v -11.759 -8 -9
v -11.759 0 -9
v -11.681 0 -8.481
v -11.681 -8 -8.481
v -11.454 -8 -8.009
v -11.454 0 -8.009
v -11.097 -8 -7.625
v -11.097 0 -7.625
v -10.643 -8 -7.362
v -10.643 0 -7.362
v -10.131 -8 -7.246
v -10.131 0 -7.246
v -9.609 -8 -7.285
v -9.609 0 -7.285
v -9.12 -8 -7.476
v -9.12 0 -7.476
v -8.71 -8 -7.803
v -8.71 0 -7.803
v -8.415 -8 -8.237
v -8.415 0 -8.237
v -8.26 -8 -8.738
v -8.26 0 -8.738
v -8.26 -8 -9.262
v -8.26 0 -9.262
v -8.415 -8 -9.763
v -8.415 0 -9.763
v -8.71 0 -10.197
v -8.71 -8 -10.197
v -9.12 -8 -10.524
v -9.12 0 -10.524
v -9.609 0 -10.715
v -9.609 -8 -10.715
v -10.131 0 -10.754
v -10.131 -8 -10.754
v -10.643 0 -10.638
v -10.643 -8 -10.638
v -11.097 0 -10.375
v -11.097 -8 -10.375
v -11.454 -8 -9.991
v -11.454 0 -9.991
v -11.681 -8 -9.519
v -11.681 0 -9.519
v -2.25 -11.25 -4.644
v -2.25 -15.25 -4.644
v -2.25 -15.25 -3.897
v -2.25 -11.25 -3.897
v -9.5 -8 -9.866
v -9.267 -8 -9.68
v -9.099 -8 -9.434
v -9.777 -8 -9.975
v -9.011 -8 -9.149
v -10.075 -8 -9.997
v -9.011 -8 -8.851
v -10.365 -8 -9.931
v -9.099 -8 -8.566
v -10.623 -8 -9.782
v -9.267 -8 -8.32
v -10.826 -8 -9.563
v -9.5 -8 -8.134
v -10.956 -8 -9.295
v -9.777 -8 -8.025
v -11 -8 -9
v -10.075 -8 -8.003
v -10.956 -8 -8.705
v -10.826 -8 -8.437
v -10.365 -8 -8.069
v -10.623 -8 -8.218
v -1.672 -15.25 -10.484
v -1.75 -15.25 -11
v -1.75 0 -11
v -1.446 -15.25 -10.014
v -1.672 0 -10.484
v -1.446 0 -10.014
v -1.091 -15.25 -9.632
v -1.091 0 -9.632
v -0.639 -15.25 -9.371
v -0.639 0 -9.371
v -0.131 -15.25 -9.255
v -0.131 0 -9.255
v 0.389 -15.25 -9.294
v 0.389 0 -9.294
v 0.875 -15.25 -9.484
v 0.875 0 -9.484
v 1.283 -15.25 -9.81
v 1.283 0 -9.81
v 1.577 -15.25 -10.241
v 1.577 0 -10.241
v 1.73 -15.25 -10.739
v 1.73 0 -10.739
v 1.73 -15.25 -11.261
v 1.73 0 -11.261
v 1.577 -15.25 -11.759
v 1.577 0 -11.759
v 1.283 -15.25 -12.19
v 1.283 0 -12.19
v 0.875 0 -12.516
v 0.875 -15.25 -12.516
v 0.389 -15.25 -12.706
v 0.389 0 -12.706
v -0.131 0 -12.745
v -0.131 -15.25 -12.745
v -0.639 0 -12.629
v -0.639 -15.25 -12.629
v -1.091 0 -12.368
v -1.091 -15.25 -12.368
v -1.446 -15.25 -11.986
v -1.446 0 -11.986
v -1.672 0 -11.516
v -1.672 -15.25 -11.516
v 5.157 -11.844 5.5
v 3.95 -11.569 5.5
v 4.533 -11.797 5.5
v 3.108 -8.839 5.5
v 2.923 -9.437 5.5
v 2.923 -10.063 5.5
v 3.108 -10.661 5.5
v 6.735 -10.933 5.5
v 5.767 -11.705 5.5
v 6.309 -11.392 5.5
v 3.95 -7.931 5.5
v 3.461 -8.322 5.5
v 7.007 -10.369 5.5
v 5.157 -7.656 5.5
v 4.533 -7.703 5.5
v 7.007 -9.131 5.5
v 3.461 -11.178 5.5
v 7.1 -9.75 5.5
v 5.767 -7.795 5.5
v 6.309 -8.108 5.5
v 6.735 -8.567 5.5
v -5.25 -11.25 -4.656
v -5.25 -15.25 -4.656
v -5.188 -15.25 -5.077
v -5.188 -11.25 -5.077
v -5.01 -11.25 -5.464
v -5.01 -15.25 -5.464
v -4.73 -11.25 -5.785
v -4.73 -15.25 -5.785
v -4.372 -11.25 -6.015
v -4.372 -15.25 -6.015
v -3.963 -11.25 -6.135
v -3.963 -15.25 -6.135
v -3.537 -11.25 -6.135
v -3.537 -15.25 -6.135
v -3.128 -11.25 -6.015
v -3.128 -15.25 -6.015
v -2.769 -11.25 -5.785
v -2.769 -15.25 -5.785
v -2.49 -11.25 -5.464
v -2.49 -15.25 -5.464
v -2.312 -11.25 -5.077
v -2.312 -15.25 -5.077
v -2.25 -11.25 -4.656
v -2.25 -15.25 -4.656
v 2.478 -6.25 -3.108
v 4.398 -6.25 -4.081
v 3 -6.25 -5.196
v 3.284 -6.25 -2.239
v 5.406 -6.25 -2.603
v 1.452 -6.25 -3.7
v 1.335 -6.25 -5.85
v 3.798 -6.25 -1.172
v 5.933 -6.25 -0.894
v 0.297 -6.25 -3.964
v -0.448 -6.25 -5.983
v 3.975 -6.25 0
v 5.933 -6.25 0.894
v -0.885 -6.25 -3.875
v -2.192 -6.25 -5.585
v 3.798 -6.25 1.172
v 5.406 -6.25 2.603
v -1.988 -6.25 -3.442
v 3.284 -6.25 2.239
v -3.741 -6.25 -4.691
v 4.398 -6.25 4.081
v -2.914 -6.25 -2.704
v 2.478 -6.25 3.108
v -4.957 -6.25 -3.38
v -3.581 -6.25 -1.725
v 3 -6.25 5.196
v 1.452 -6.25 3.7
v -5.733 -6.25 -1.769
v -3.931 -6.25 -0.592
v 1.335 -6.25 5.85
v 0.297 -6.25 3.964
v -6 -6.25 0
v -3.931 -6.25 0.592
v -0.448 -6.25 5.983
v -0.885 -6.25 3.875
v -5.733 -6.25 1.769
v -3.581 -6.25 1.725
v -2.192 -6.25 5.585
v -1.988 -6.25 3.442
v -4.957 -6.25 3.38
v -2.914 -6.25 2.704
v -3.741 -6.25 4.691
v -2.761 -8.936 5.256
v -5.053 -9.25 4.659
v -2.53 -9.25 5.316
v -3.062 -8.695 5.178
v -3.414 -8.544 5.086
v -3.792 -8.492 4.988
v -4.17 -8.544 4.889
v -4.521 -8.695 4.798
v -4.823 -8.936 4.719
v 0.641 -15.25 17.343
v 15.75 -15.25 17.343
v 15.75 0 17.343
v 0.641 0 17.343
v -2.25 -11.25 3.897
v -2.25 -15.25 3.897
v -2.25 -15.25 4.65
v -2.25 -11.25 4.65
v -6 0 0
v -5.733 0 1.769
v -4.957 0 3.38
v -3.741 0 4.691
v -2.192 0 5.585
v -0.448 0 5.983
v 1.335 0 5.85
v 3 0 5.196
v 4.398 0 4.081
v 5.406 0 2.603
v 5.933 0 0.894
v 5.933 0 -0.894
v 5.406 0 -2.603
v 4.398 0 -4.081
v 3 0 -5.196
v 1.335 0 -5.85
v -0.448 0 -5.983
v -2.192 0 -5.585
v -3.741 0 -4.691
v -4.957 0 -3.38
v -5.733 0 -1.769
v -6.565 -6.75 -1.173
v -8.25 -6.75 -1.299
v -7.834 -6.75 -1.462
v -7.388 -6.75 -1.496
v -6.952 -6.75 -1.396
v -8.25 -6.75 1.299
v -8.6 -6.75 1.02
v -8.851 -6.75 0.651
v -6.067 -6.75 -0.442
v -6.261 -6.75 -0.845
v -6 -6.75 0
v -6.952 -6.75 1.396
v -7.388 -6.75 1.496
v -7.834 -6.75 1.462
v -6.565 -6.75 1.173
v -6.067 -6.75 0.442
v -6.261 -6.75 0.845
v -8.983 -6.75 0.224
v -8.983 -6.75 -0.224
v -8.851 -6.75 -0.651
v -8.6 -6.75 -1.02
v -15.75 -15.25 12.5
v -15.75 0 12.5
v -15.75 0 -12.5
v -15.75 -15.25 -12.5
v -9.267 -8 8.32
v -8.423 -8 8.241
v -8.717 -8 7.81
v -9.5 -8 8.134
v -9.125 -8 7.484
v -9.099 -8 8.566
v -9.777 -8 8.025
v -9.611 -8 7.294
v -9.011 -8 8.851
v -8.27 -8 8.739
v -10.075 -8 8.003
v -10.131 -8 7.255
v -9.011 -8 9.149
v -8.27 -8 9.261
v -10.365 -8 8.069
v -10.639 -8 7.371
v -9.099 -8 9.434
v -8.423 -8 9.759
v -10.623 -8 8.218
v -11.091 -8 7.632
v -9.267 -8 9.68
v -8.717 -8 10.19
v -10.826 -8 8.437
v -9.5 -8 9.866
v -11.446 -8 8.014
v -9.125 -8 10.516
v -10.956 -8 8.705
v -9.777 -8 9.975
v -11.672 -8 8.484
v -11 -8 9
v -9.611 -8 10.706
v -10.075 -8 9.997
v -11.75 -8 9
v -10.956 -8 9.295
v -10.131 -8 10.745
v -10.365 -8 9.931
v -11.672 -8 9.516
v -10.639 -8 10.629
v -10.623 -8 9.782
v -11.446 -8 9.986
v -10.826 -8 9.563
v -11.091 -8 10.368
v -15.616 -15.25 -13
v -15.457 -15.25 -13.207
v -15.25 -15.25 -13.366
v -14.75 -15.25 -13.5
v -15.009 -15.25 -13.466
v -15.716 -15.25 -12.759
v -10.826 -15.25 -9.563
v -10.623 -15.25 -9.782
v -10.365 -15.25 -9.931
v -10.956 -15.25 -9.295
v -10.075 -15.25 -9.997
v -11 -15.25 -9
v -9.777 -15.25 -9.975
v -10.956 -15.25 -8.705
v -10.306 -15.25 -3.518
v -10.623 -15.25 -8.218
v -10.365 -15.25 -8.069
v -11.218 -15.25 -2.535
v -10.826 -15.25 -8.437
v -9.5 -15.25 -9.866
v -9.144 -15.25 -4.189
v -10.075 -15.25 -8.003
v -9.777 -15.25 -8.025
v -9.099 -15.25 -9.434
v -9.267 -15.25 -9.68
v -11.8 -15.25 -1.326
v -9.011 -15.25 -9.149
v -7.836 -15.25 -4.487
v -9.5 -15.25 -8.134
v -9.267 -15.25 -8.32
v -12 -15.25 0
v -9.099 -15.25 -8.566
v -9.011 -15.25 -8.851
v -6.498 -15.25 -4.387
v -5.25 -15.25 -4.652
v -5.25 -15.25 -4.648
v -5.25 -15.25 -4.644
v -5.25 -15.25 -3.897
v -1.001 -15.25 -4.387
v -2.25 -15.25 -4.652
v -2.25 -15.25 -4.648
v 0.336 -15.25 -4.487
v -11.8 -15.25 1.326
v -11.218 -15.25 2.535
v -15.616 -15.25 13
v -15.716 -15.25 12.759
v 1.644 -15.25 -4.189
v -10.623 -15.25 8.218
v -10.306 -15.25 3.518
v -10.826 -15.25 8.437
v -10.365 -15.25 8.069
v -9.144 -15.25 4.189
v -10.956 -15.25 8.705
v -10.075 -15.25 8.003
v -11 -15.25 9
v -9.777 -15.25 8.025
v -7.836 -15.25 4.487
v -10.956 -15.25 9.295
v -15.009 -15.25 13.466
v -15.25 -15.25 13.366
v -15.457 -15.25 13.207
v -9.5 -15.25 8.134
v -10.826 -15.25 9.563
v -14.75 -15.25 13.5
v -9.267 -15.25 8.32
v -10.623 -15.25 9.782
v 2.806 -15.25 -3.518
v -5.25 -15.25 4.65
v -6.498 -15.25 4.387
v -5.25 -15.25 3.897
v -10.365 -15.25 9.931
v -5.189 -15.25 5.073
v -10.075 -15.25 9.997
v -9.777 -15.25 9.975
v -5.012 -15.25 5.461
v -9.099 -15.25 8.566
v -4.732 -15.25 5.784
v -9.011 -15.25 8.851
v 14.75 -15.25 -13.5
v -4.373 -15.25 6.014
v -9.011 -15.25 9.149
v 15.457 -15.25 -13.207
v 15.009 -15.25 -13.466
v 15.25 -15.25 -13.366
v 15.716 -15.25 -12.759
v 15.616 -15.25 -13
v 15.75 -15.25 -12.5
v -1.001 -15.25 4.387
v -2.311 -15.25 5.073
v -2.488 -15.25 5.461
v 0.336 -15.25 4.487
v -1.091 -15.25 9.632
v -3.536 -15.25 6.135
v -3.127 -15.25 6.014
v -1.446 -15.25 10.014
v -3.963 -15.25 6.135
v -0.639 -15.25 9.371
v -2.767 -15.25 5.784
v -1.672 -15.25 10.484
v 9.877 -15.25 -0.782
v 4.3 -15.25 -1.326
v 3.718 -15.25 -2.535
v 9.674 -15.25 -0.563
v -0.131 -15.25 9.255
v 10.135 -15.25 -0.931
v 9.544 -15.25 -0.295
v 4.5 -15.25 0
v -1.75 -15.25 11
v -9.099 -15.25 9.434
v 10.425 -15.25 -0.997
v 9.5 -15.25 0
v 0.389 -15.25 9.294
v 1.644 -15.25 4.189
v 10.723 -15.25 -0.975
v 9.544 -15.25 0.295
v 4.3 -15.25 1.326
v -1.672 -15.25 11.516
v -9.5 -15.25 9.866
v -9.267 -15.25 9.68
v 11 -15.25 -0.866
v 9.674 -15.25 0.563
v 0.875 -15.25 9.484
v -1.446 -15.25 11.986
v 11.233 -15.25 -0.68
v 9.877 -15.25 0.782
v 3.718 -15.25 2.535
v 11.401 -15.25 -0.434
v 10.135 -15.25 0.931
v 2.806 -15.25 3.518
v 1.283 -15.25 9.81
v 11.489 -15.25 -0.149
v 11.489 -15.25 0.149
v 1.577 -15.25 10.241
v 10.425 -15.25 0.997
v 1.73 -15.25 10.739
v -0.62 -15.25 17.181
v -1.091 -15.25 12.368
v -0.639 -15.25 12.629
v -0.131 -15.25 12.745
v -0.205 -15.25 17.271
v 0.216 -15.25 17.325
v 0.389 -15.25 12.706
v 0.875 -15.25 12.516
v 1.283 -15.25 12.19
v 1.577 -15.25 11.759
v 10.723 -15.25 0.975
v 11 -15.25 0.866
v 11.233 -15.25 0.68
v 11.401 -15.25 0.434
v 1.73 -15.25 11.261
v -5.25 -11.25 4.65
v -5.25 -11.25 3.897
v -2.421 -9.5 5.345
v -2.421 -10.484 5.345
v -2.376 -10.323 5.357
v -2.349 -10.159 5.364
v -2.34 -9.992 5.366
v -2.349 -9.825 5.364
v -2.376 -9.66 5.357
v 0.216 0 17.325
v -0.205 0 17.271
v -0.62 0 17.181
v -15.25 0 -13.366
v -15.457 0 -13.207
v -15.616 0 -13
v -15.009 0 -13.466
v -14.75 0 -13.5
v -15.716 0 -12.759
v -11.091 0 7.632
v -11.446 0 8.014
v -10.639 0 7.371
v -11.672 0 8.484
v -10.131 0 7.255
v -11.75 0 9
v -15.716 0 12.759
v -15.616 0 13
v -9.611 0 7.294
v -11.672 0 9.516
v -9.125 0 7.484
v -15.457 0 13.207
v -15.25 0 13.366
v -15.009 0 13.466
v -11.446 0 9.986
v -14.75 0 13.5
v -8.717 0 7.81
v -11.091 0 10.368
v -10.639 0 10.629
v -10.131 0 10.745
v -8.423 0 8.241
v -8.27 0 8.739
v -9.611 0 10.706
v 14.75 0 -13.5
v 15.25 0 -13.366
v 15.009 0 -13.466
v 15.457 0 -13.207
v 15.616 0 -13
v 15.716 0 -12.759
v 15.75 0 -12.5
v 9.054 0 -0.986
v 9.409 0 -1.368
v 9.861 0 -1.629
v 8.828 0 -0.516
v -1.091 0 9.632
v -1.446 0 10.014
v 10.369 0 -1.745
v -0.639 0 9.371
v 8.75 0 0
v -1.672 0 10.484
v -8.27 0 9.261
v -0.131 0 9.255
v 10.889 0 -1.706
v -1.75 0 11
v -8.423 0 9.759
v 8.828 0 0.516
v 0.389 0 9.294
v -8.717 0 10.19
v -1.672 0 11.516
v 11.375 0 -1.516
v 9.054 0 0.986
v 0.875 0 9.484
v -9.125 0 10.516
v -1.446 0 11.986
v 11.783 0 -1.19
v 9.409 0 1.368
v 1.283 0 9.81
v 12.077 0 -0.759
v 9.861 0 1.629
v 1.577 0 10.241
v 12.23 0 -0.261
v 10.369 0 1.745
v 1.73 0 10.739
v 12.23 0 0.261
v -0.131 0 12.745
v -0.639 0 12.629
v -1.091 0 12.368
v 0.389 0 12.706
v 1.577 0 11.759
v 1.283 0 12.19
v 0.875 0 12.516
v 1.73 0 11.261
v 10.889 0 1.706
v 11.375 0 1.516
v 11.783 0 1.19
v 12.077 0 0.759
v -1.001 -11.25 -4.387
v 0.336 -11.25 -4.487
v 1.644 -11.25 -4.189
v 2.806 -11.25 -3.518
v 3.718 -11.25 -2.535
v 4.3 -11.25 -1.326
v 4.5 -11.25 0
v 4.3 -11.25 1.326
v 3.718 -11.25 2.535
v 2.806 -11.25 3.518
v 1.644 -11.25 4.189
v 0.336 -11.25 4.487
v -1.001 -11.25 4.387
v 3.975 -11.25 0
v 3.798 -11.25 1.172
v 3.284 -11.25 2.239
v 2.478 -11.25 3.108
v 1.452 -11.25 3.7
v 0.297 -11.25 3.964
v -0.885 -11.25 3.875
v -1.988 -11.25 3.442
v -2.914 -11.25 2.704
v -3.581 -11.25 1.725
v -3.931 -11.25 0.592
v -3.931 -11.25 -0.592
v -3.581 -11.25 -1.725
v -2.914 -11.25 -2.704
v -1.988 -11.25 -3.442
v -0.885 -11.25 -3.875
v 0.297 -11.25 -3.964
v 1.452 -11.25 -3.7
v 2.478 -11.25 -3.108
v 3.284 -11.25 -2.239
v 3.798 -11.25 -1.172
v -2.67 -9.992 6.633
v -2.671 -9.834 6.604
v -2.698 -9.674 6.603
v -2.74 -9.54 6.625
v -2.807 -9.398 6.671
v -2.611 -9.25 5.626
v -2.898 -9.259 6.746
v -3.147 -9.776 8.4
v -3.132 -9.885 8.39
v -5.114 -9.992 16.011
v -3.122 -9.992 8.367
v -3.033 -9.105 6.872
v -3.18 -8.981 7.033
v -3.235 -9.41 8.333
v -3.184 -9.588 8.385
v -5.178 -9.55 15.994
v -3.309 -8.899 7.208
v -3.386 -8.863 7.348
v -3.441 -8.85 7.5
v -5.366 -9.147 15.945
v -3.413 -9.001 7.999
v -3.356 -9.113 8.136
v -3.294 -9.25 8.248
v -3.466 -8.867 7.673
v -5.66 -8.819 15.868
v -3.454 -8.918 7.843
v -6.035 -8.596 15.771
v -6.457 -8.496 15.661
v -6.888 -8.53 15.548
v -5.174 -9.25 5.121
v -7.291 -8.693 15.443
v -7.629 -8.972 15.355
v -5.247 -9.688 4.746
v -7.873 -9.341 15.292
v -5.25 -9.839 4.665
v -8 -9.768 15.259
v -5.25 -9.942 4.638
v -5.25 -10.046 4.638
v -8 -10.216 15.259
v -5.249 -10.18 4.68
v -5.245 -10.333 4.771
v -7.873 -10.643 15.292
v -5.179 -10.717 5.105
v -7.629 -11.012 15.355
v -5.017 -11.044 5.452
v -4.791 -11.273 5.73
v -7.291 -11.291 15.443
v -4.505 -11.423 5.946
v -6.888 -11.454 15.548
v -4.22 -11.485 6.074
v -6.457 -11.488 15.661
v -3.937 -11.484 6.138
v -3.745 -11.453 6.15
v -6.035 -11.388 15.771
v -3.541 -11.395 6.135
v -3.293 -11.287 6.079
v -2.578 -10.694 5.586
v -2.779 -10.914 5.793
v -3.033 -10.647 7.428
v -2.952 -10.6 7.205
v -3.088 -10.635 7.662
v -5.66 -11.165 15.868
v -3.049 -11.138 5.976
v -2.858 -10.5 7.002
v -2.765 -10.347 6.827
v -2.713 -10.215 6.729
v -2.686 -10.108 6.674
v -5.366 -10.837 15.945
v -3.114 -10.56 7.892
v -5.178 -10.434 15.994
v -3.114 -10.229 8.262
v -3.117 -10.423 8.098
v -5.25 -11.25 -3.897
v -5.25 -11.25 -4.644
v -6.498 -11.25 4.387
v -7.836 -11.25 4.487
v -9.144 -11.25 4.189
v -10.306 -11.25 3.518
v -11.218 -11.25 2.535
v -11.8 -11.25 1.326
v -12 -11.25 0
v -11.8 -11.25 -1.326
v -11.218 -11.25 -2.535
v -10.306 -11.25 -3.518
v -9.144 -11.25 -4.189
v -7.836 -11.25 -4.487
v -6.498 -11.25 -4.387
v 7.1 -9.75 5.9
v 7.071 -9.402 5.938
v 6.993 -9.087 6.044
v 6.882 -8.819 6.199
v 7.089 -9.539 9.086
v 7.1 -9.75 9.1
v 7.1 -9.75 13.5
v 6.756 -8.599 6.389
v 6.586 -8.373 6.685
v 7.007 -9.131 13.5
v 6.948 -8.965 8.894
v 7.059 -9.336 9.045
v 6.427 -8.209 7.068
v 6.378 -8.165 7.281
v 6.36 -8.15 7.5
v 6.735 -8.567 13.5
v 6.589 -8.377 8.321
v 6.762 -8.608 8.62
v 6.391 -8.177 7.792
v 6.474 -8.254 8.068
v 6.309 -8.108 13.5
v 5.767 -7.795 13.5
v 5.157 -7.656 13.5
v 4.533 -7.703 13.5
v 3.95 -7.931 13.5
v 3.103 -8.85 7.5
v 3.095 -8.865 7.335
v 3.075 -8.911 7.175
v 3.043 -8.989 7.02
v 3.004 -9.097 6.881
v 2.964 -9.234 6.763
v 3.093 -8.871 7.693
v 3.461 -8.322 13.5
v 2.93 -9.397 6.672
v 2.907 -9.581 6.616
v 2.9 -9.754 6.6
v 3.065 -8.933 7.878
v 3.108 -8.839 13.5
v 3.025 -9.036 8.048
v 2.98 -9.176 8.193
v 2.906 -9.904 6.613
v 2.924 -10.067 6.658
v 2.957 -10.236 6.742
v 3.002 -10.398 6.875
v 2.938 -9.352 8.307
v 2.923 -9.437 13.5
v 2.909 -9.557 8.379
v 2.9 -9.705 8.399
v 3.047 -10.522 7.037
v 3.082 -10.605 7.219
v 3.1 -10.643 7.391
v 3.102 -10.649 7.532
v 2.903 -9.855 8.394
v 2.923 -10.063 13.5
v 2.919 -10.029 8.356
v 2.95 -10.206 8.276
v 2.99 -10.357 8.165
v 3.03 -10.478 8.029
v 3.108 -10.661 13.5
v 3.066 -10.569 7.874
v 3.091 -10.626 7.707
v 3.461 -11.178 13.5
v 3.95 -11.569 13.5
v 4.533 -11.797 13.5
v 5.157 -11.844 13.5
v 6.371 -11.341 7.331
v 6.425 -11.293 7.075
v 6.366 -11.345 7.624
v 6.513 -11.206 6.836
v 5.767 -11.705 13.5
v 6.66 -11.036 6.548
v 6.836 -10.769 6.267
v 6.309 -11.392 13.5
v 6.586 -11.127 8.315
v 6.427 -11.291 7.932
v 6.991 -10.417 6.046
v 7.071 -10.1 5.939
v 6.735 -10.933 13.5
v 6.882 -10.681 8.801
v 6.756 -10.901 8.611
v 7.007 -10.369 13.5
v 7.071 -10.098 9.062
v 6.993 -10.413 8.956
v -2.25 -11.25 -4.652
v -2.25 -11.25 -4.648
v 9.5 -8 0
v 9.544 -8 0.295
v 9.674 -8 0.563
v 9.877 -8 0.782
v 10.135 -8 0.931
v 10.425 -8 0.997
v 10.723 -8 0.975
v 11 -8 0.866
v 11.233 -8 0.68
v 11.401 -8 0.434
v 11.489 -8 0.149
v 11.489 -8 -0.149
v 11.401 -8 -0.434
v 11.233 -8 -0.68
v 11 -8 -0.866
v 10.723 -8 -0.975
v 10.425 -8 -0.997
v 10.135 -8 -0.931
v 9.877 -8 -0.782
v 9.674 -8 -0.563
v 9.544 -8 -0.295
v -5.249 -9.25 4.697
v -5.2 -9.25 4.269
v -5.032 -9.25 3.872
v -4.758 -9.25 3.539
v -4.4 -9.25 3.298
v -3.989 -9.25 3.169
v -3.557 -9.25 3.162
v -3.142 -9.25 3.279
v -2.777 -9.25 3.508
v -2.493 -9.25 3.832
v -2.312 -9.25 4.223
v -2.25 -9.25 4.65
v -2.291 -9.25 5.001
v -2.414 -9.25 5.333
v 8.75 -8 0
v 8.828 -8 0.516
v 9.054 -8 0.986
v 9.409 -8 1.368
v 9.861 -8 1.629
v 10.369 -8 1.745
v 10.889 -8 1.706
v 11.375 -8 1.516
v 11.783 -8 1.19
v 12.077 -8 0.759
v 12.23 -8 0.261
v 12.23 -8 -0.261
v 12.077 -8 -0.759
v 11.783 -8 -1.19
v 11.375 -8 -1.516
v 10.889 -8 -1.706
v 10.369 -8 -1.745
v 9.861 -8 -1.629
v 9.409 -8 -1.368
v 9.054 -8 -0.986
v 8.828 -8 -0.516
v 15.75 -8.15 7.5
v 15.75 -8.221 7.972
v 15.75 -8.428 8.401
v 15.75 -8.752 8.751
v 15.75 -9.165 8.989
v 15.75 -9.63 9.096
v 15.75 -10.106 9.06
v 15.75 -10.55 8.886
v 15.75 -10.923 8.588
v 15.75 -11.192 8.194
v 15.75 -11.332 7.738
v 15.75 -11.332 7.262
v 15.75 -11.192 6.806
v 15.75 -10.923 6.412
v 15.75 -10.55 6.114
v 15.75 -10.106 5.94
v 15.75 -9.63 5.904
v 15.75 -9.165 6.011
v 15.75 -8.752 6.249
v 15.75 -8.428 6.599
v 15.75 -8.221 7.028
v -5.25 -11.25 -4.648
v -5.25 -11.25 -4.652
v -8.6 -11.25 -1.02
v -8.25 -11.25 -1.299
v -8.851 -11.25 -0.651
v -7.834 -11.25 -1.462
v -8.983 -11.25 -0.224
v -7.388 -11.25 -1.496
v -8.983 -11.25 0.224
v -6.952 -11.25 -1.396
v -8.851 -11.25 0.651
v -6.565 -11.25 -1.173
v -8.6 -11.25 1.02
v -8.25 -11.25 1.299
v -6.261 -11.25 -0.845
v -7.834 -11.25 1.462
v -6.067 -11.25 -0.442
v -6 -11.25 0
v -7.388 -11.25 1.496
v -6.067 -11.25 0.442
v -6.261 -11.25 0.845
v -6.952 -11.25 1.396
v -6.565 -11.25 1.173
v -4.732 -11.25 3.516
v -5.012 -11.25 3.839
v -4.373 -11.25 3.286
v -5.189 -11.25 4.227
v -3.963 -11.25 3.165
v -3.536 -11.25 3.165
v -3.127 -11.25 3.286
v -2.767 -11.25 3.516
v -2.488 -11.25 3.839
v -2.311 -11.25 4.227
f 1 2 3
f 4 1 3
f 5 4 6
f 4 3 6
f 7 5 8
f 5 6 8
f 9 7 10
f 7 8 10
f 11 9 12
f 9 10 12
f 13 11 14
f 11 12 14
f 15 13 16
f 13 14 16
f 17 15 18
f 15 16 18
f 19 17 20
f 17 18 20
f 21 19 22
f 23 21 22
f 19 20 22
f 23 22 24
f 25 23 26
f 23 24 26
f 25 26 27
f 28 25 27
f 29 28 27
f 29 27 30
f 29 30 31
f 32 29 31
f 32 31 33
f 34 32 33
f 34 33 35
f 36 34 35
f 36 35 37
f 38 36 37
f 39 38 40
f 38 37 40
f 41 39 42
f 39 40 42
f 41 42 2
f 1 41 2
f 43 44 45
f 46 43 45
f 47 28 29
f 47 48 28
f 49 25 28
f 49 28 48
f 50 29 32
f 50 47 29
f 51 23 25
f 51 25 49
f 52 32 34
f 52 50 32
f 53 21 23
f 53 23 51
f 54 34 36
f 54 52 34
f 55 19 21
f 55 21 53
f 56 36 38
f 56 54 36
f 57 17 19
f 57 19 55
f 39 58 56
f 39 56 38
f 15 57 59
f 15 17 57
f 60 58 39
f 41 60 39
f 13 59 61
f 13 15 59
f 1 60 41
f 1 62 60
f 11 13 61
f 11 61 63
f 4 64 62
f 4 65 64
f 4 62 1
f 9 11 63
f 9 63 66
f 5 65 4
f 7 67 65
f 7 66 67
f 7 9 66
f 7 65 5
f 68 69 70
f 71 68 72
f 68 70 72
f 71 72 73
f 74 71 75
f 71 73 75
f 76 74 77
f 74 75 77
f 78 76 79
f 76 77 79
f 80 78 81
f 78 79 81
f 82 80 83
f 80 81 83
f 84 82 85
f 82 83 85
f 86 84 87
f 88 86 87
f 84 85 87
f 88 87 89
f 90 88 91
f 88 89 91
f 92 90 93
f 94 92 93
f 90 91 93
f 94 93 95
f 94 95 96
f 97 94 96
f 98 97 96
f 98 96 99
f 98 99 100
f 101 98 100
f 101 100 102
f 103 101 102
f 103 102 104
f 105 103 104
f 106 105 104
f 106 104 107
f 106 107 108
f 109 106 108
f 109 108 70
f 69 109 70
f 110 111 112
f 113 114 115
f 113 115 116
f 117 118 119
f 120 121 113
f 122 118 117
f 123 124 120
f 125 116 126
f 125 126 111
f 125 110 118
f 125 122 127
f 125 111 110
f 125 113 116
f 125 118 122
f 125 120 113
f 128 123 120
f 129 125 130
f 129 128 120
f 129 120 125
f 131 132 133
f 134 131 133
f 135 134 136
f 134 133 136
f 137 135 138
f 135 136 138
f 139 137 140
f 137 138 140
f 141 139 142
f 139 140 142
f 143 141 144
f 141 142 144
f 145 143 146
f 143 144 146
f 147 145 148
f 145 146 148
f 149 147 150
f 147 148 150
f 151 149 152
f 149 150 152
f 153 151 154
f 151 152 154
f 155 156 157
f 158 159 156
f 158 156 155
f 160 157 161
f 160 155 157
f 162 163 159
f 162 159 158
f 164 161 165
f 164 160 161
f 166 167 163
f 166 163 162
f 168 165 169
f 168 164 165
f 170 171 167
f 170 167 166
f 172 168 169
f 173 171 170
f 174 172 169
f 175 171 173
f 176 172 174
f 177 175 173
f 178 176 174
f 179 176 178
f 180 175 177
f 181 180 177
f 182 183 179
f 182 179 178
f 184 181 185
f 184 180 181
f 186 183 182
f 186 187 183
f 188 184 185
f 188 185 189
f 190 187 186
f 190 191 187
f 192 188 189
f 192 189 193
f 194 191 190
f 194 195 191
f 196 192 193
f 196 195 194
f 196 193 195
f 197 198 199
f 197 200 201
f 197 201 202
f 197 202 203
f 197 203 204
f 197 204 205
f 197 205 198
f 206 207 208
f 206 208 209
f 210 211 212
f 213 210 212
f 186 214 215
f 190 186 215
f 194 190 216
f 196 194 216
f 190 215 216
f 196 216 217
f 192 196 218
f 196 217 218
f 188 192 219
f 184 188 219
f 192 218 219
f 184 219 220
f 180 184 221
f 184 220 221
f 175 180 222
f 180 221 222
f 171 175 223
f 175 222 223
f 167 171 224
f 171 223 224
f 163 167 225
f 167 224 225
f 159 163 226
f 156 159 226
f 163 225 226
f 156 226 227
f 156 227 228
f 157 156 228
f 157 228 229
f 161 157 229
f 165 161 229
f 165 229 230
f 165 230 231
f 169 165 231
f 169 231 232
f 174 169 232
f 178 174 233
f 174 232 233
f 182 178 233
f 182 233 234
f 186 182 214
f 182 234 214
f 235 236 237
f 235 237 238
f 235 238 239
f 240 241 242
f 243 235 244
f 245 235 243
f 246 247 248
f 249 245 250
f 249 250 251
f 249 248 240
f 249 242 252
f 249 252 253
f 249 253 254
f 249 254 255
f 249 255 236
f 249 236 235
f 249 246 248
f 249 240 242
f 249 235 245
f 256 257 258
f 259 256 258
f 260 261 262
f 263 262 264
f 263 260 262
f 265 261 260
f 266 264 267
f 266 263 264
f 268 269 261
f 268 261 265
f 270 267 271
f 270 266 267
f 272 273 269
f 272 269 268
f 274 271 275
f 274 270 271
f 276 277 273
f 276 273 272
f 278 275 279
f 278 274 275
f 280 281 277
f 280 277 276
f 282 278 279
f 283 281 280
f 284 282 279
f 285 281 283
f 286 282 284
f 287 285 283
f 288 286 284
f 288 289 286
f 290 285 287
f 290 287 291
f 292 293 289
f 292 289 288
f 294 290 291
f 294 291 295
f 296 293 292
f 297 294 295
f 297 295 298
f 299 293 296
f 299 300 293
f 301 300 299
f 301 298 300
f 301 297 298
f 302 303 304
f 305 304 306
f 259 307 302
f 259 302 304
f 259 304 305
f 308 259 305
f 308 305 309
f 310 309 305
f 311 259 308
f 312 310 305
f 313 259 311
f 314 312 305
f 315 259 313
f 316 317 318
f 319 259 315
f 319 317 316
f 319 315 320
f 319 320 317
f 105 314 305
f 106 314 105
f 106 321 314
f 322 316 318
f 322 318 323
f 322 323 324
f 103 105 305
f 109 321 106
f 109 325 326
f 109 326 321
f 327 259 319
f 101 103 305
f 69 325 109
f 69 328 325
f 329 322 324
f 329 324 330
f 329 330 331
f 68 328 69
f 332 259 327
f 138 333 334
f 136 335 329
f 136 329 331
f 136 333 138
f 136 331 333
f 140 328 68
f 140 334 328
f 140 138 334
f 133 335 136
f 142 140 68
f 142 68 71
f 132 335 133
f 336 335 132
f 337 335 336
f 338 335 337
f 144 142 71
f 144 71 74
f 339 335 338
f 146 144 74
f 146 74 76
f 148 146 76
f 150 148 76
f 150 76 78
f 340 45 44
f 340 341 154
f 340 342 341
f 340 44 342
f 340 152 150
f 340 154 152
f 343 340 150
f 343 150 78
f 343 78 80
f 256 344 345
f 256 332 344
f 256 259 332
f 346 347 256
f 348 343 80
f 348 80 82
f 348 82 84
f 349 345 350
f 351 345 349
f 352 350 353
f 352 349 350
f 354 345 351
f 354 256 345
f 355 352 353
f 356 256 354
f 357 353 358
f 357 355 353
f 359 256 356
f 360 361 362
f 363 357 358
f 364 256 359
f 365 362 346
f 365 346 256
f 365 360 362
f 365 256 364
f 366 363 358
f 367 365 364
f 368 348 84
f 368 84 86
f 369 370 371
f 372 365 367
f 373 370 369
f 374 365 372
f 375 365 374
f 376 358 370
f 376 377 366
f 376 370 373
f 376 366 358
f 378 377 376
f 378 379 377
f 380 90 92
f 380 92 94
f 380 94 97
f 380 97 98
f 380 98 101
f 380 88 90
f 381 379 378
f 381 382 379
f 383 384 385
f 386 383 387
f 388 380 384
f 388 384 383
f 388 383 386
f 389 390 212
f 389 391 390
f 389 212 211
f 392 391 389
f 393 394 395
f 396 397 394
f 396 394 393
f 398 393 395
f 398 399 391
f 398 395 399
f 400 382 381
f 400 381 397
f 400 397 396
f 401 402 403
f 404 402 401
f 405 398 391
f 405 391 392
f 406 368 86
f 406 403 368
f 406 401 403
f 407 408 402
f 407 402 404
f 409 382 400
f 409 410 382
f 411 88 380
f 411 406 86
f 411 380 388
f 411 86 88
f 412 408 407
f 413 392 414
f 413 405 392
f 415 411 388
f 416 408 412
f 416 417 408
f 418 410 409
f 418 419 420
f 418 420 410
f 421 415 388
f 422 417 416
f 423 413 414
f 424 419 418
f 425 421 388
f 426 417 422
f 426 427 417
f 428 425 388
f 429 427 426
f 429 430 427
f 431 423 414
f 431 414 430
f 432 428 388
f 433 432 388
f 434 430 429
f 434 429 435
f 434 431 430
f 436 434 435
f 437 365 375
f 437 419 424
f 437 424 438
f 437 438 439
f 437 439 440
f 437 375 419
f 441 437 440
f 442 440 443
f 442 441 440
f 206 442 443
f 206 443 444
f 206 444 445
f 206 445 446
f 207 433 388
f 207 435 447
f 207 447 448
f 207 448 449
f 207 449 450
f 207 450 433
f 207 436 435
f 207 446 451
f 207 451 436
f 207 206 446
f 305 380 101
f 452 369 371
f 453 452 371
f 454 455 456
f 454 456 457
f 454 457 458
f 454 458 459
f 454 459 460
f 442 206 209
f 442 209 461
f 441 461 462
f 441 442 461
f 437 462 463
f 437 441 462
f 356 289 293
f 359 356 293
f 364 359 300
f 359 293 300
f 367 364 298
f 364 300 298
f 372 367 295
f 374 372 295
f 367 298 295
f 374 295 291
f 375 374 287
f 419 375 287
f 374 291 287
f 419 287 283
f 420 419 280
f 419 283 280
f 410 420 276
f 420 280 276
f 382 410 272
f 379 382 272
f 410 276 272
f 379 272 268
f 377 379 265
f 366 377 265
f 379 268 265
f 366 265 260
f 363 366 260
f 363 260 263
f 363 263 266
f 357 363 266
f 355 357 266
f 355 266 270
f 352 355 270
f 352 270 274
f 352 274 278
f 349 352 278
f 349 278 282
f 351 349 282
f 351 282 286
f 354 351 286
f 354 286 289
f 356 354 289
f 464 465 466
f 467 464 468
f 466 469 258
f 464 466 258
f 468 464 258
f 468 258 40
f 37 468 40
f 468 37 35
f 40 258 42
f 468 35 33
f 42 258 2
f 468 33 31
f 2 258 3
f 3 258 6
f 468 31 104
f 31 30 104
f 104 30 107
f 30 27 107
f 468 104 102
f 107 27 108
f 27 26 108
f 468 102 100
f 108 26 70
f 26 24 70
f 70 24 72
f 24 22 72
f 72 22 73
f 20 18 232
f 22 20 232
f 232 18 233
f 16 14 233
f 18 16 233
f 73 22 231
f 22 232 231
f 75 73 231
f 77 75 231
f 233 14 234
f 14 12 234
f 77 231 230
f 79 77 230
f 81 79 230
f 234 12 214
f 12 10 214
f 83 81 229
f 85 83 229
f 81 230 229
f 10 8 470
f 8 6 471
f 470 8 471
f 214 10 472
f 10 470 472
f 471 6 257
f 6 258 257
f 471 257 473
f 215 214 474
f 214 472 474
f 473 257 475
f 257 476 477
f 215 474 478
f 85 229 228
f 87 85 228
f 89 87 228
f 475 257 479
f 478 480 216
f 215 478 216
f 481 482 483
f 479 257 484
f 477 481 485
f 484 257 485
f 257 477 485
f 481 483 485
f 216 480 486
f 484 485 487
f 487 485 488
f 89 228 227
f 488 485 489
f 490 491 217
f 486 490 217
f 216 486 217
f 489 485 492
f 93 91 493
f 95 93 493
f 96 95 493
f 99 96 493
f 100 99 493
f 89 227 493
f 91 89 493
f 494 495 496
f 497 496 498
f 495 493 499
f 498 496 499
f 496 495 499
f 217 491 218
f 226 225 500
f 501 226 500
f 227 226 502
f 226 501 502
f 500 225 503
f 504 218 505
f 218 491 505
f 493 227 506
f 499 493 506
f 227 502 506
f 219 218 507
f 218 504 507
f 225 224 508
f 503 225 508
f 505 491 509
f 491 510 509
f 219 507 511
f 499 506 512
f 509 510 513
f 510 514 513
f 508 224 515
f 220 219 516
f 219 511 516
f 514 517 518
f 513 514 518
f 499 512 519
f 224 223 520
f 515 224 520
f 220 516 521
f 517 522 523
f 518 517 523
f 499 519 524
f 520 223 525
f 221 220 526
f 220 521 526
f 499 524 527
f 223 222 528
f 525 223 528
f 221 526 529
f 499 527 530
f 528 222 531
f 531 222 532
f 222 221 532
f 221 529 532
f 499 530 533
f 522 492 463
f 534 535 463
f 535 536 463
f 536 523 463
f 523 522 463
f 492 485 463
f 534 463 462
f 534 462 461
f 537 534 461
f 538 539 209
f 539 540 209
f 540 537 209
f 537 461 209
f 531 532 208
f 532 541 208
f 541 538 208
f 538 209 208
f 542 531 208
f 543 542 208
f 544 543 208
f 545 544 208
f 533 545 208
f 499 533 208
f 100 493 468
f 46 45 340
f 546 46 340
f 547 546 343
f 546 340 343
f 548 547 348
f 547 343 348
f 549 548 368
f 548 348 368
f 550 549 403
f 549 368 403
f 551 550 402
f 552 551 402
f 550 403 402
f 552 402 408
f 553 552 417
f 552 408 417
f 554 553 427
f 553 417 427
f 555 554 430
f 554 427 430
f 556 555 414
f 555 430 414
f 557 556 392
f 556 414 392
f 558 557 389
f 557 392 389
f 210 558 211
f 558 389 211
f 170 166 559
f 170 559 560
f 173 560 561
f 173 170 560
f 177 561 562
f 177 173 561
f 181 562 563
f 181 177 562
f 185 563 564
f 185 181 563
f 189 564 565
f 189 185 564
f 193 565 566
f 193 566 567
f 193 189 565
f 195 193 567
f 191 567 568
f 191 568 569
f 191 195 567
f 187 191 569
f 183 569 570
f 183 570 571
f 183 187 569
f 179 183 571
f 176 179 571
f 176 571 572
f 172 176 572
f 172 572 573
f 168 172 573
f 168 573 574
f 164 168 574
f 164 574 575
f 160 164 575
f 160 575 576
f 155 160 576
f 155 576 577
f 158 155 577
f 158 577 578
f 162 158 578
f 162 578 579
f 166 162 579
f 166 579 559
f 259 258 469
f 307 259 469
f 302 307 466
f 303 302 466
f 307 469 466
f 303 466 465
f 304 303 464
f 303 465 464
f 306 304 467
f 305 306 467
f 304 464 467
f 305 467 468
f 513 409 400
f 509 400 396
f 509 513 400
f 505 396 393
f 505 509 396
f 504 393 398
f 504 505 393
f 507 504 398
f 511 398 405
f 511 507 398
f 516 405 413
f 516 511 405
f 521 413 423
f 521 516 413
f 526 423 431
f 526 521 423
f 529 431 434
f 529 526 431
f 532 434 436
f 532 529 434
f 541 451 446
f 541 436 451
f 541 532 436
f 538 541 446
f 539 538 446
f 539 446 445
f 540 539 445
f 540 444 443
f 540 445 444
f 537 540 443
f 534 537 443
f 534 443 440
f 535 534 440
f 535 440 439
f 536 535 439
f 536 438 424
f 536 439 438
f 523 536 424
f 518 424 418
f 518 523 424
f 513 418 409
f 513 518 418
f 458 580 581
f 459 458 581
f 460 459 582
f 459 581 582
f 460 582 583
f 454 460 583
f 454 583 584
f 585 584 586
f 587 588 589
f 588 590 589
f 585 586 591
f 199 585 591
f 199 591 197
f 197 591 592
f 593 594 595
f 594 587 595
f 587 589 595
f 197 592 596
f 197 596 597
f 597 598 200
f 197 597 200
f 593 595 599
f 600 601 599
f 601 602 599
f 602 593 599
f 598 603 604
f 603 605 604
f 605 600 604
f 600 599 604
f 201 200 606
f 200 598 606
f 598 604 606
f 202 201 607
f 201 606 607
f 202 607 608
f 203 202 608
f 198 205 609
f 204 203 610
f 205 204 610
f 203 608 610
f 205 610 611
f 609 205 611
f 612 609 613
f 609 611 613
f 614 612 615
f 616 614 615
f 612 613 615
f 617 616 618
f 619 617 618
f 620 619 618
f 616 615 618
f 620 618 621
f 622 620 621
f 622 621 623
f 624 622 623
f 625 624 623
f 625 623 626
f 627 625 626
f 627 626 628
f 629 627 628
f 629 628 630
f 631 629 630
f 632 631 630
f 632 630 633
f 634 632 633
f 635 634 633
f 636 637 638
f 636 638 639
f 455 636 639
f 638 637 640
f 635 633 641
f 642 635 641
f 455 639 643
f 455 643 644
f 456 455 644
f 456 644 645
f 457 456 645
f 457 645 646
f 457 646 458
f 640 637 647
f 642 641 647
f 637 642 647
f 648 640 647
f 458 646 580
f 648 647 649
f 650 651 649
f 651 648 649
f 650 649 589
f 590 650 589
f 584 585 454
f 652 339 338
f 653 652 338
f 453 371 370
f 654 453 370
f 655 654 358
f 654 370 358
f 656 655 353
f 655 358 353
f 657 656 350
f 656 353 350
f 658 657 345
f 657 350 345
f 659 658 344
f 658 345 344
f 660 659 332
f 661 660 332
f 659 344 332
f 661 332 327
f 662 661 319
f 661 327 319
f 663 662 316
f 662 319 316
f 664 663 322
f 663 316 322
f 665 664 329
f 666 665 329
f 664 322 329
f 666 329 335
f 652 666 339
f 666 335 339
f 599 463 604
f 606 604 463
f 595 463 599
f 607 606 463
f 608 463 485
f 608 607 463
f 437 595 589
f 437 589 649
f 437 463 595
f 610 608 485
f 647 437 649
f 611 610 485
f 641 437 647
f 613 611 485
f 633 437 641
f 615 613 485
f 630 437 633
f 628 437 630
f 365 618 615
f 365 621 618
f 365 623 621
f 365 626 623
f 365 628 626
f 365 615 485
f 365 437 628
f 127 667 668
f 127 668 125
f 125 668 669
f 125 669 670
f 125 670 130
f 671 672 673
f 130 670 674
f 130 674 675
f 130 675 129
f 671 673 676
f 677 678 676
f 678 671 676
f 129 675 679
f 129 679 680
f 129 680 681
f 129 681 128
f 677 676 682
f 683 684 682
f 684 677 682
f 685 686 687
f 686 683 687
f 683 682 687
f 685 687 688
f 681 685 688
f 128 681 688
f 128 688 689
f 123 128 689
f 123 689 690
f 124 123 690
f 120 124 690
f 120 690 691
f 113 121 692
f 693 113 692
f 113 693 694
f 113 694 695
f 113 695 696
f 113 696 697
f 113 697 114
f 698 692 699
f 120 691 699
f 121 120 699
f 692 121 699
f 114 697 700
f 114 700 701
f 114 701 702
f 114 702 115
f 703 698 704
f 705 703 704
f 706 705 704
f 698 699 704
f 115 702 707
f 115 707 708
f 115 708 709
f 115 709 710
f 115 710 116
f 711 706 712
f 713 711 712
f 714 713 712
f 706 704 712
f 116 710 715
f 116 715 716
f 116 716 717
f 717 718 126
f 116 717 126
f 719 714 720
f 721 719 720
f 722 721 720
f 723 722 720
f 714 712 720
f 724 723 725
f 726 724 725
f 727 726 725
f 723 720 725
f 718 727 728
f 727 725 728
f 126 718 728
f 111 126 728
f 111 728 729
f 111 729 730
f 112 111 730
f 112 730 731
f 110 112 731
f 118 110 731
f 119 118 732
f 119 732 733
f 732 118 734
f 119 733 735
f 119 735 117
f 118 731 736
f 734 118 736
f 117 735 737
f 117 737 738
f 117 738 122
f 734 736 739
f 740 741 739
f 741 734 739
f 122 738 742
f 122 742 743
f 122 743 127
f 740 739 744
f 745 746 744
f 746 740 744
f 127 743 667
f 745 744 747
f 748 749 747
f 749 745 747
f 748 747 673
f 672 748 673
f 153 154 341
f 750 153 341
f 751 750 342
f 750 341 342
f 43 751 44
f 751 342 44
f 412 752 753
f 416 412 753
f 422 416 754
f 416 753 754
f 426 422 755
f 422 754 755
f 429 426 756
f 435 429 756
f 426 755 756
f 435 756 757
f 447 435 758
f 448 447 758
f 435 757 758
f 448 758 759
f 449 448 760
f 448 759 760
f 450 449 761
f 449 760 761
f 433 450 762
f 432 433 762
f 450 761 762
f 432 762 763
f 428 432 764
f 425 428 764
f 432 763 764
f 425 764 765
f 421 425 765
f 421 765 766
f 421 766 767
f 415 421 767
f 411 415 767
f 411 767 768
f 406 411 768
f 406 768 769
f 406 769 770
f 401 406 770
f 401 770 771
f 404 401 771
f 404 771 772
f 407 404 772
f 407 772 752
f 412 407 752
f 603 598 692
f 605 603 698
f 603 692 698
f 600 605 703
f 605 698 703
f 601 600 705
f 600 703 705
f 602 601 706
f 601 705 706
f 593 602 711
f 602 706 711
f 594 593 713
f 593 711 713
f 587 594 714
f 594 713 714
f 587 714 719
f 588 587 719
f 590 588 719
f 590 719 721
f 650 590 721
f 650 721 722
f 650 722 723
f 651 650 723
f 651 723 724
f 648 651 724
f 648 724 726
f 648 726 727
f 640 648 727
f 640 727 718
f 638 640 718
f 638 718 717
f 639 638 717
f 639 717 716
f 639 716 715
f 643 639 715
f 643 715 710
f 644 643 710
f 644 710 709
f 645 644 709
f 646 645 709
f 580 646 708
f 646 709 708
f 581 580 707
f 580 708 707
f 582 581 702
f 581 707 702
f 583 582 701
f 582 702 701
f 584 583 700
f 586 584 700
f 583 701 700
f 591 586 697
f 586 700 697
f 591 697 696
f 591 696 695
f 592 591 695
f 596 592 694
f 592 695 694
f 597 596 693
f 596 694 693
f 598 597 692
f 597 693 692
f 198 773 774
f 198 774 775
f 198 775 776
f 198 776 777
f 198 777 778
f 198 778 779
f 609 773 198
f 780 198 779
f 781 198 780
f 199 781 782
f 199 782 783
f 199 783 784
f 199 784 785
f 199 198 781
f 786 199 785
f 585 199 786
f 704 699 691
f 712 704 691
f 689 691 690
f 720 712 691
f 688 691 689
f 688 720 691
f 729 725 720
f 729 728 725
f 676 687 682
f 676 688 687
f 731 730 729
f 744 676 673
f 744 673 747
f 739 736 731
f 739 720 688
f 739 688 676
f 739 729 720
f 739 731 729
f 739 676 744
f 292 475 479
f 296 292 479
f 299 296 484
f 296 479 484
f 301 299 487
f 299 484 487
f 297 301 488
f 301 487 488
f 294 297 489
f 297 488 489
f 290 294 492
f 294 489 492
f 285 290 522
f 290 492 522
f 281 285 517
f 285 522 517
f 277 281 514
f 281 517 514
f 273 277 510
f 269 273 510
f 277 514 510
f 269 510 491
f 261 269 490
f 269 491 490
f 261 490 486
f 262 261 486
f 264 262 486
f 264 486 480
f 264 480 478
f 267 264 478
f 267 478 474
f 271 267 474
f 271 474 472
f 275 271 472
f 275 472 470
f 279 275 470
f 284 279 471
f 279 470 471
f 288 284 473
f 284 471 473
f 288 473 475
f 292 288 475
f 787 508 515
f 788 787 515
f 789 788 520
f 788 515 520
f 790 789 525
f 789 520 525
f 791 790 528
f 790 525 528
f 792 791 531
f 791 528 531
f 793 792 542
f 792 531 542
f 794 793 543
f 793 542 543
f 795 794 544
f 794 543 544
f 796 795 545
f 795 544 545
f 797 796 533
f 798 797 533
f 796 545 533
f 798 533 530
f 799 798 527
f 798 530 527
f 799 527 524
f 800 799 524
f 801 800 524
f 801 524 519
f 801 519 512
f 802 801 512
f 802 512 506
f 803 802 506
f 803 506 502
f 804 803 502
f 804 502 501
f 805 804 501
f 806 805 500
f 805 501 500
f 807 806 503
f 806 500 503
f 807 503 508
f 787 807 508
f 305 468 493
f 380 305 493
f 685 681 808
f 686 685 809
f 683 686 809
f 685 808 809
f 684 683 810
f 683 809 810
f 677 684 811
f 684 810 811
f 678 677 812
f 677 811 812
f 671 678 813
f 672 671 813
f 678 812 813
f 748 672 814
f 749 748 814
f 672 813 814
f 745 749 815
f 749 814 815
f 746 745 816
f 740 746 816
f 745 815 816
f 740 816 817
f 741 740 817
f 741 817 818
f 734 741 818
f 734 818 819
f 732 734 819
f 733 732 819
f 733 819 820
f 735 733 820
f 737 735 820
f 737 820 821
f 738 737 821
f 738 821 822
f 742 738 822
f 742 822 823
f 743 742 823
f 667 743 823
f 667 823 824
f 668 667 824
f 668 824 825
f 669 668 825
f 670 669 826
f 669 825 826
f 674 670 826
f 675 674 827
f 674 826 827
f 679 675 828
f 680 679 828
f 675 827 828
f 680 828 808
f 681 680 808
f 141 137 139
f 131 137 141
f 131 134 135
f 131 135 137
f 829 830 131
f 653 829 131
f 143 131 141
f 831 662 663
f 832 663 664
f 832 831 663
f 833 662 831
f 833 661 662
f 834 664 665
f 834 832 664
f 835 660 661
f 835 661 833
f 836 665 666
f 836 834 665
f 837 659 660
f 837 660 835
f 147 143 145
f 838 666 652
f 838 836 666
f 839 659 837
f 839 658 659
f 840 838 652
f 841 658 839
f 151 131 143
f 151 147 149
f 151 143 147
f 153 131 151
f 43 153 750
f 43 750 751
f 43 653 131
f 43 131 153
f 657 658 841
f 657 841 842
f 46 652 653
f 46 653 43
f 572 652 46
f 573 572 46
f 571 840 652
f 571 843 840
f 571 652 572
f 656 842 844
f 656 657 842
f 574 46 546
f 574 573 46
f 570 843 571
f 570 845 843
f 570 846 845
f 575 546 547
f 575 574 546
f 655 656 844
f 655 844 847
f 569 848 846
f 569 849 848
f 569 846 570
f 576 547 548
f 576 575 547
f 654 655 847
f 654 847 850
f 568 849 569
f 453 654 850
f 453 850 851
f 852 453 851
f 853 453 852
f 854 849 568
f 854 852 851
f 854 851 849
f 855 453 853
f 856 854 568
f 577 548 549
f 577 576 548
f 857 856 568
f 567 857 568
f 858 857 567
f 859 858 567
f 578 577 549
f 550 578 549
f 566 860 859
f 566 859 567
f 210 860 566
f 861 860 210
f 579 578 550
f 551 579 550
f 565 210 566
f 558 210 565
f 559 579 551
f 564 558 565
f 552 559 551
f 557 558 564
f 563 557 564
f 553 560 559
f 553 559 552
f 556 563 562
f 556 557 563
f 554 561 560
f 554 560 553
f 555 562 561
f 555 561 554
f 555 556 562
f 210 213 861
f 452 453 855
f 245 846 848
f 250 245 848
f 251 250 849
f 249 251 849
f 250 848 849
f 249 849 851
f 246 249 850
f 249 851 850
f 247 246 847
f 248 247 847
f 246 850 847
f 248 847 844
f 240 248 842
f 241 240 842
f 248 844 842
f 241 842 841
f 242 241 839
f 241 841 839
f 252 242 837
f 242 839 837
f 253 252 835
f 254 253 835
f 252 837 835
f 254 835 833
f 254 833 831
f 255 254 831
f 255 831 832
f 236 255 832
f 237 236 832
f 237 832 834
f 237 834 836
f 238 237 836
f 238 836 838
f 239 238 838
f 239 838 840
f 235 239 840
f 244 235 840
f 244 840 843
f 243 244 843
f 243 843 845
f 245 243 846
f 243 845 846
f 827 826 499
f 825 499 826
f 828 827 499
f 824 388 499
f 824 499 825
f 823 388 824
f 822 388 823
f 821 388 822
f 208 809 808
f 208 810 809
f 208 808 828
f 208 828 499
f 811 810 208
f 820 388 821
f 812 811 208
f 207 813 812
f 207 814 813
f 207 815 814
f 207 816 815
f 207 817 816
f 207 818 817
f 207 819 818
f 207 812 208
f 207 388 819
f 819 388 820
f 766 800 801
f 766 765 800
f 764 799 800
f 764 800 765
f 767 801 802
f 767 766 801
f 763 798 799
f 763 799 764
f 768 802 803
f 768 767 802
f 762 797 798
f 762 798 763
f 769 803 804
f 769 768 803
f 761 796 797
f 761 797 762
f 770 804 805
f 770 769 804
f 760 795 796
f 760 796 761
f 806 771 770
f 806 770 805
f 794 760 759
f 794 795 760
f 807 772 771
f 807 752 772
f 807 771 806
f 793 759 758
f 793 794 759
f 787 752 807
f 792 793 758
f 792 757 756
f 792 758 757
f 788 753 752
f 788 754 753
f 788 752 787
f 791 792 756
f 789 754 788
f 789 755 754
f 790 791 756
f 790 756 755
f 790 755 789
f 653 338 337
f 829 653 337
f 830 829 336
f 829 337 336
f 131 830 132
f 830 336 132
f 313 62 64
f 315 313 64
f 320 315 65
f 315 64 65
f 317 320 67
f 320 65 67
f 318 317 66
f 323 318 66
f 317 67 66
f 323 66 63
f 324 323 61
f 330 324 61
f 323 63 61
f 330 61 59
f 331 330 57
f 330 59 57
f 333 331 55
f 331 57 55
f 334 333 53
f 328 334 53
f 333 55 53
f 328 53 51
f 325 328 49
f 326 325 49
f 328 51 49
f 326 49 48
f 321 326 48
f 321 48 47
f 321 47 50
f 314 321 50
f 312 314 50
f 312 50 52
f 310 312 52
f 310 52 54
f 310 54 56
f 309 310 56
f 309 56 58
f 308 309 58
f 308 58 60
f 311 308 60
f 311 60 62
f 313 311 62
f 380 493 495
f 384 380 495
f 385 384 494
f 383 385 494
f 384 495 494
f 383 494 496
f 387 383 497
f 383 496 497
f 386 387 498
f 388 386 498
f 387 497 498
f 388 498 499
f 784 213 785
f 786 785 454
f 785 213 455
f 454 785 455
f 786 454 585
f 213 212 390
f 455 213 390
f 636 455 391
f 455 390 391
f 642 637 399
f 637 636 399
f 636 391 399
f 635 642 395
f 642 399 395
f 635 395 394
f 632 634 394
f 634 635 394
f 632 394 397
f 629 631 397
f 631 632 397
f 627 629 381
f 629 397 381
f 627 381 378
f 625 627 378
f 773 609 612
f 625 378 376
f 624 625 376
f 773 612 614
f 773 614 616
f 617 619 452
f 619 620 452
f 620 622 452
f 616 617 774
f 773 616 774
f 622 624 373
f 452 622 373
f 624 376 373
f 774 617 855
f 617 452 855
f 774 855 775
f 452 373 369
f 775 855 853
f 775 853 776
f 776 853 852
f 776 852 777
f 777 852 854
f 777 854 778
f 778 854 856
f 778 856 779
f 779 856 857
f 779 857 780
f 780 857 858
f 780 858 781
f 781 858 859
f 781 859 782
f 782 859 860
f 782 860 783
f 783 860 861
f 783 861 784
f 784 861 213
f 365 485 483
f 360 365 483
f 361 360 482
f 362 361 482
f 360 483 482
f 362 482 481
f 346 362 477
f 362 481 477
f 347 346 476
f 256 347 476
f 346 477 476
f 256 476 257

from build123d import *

# Parameters (mm, degrees)
F0_R             = 6
F0_R_2           = 3.975
F1_DEPTH         = 15.25
F2_R             = 6
F2_R_2           = 3.975
F3_DEPTH         = 6.25
F4_R             = 3.975
F5_DEPTH         = 4
F6_R             = 1.5
F7_DEPTH         = 4.5
F8_R             = 1.75
F9_DEPTH         = 15.251
F10_R            = 1
F11_DEPTH        = 15.251
F11_COPIES_COUNT = 2
F11_COPIES_PITCH = 22.388613
F12_R            = 1.7592557298
F12_R_2          = 1
F12_R_3          = 1.75
F13_DEPTH        = 8
F14_R            = 2.1
F15_DEPTH        = 8
F17_DEPTH        = 2
F18_R            = 1.6
F19_DEPTH        = 12
F20_R            = 0.9
F21_DEPTH        = 20
F23_DEPTH        = 15.25
F24_R            = 1.5
F25_DEPTH        = 11


# Not quite as in the source:
# - a pattern or mirror of a feature is missing from the dataset's text; its kind, count and spacing are read off the source's solid
# - a feature names something its author has since deleted; it is built from what else it names


with BuildPart() as f1:
    # F0 (on Front) → F1 (new body)
    with BuildSketch(Plane.XZ):
        with BuildLine():
            Line((-14.75, -13.5), (14.75, -13.5))
            ThreePointArc((14.75, -13.5), (15.4571067812, -13.2071067812), (15.75, -12.5))
            Line((15.75, -12.5), (15.75, 12.5))
            ThreePointArc((15.75, 12.5), (15.4571067812, 13.2071067812), (14.75, 13.5))
            Line((14.75, 13.5), (-14.75, 13.5))
            ThreePointArc((-14.75, 13.5), (-15.4571067812, 13.2071067812), (-15.75, 12.5))
            Line((-15.75, 12.5), (-15.75, -12.5))
            ThreePointArc((-15.75, -12.5), (-15.4571067812, -13.2071067812), (-14.75, -13.5))
        make_face()
        Circle(F0_R, mode=Mode.SUBTRACT)
        Circle(F0_R)
        Circle(F0_R_2, mode=Mode.SUBTRACT)
    extrude(amount=F1_DEPTH)

    # F2 (on face) → F3 (cut)
    with BuildSketch(Plane(origin=(0, 0, 0), x_dir=(-1, 0, 0), z_dir=(0, 1, 0))):
        Circle(F2_R)
        Circle(F2_R_2, mode=Mode.SUBTRACT)
    extrude(amount=-F3_DEPTH, mode=Mode.SUBTRACT)

    # F4 (on face) → F5 (cut)
    with BuildSketch(Plane.XZ.offset(15.25)):
        with BuildLine():
            Line((-2.2497879514, -4.6444608866), (-2.2497871292, -3.8972372103))
            ThreePointArc((-2.2497871292, -3.8972372103), (4.5, -4.9516e-06), (-2.2497785524, 3.8972421615))
            Line((-2.2497785524, 3.8972421615), (-2.2497777241, 4.6499983495))
            ThreePointArc((-2.2497777241, 4.6499983495), (-3.7497777241, 6.15), (-5.2497777241, 4.6499983495))
            Line((-5.2497777241, 4.6499983495), (-5.2497768955, 3.8969854991))
            ThreePointArc((-5.2497768955, 3.8969854991), (-12, -4.9516e-06), (-5.2497683193, -3.8969805469))
            Line((-5.2497683193, -3.8969805469), (-5.2497674968, -4.6444608866))
            ThreePointArc((-5.2497674968, -4.6444608866), (-5.2497777241, -4.6500016505), (-5.2497674846, -4.6555424145))
            ThreePointArc((-5.2497674846, -4.6555424145), (-3.7497777241, -6.15), (-2.2497879636, -4.6555424145))
            ThreePointArc((-2.2497879636, -4.6555424145), (-2.2497777241, -4.6500016505), (-2.2497879514, -4.6444608866))
        make_face()
        Circle(F4_R, mode=Mode.SUBTRACT)
    extrude(amount=-F5_DEPTH, mode=Mode.SUBTRACT)

    # F6 (on face) → F7 (cut)
    with BuildSketch(Plane.XZ.offset(11.25)):
        with Locations((-7.5, 0)):
            Circle(F6_R)
    extrude(amount=-F7_DEPTH, mode=Mode.SUBTRACT)

    # F8 (on face) → F9 (cut, through all)
    with BuildSketch(Plane(origin=(0, 0, 0), x_dir=(-1, 0, 0), z_dir=(0, 1, 0))):
        with Locations((0, -11)):
            Circle(F8_R)
    f9 = extrude(amount=-F9_DEPTH, mode=Mode.SUBTRACT)

    # F9_copies: F9 across plane
    add(f9.mirror(Plane.XY), mode=Mode.SUBTRACT)

    # F10 (on face) → F11 (cut, through all)
    with BuildSketch(Plane(origin=(0, 0, 0), x_dir=(-1, 0, 0), z_dir=(0, 1, 0))):
        with Locations((-10.5, 0)):
            Circle(F10_R)
        with Locations((10, -9)):
            Circle(F10_R)
    f11 = extrude(amount=-F11_DEPTH, mode=Mode.SUBTRACT)

    # F11_copies: F11 ×2
    with Locations(*[Vector(-0.9156440302, 0, 0.401990062) * (i * F11_COPIES_PITCH) for i in range(1, F11_COPIES_COUNT)]):
        add(f11, mode=Mode.SUBTRACT)

    # F12 (on face) → F13 (cut)
    with BuildSketch(Plane(origin=(0, 0, 0), x_dir=(-1, 0, 0), z_dir=(0, 1, 0))):
        with Locations((10, -9)):
            Circle(F12_R)
        with Locations((10, -9)):
            Circle(F12_R_2, mode=Mode.SUBTRACT)
        with Locations((-10.5, 0)):
            Circle(F12_R_3)
        with Locations((-10.5, 0)):
            Circle(F12_R_2, mode=Mode.SUBTRACT)
        with Locations((10, 9)):
            Circle(F12_R_3)
        with Locations((9.9999998377, 8.9999999288)):
            Circle(F12_R_2, mode=Mode.SUBTRACT)
    extrude(amount=-F13_DEPTH, mode=Mode.SUBTRACT)

    # F14 (on face) → F15 (cut)
    with BuildSketch(Plane.XY.offset(13.5)):
        with Locations((5, -9.75)):
            Circle(F14_R)
    extrude(amount=-F15_DEPTH, mode=Mode.SUBTRACT)

    # F16 (on face) → F17 (cut)
    with BuildSketch(Plane.XZ.offset(11.25)):
        with BuildLine():
            ThreePointArc((-5.2497777241, 4.6499983495), (-3.7497768988, 3.15), (-2.2497777241, 4.65))
            ThreePointArc((-2.2497777241, 4.65), (-3.7497785494, 6.15), (-5.2497777241, 4.6499983495))
        make_face()
    extrude(amount=-F17_DEPTH, mode=Mode.SUBTRACT)

    # F18 (on face) → F19 (cut)
    with BuildSketch(Plane.YZ.offset(15.75)):
        with Locations((-9.75, 7.5)):
            Circle(F18_R)
    extrude(amount=-F19_DEPTH, mode=Mode.SUBTRACT)

    # F20 (on face) → F21 (cut)
    with BuildSketch(Plane.YZ.offset(15.75)):
        with Locations((-9.75, 7.5)):
            Circle(F20_R)
    extrude(amount=-F21_DEPTH, mode=Mode.SUBTRACT)

    # F22 (on face) → F23 (join, through all)
    with BuildSketch(Plane.XZ.offset(15.25)):
        with BuildLine():
            Line((-0.6199523885, 17.1813922581), (-14.75, 13.5))
            Line((-14.75, 13.5), (14.75, 13.5))
            ThreePointArc((14.75, 13.5), (15.4571067812, 13.2071067812), (15.75, 12.5))
            Line((15.75, 12.5), (15.75, 17.3429124444))
            Line((15.75, 17.3429124444), (0.6406479022, 17.3429124444))
            ThreePointArc((0.6406479022, 17.3429124444), (0.005194941, 17.3023680128), (-0.6199523885, 17.1813922581))
        make_face()
    extrude(amount=-F23_DEPTH)

    # F24 (on face) → F25 (cut)
    with BuildSketch(Plane(origin=(-4.2312468171, 0, 16.240518475), x_dir=(0.9676959627, 0, 0.2521200581), z_dir=(-0.2521200581, 0, 0.9676959627))):
        with Locations((-2.4117373396, -9.9919419736)):
            Circle(F24_R)
    extrude(amount=-F25_DEPTH, mode=Mode.SUBTRACT)


solid = f1.part
